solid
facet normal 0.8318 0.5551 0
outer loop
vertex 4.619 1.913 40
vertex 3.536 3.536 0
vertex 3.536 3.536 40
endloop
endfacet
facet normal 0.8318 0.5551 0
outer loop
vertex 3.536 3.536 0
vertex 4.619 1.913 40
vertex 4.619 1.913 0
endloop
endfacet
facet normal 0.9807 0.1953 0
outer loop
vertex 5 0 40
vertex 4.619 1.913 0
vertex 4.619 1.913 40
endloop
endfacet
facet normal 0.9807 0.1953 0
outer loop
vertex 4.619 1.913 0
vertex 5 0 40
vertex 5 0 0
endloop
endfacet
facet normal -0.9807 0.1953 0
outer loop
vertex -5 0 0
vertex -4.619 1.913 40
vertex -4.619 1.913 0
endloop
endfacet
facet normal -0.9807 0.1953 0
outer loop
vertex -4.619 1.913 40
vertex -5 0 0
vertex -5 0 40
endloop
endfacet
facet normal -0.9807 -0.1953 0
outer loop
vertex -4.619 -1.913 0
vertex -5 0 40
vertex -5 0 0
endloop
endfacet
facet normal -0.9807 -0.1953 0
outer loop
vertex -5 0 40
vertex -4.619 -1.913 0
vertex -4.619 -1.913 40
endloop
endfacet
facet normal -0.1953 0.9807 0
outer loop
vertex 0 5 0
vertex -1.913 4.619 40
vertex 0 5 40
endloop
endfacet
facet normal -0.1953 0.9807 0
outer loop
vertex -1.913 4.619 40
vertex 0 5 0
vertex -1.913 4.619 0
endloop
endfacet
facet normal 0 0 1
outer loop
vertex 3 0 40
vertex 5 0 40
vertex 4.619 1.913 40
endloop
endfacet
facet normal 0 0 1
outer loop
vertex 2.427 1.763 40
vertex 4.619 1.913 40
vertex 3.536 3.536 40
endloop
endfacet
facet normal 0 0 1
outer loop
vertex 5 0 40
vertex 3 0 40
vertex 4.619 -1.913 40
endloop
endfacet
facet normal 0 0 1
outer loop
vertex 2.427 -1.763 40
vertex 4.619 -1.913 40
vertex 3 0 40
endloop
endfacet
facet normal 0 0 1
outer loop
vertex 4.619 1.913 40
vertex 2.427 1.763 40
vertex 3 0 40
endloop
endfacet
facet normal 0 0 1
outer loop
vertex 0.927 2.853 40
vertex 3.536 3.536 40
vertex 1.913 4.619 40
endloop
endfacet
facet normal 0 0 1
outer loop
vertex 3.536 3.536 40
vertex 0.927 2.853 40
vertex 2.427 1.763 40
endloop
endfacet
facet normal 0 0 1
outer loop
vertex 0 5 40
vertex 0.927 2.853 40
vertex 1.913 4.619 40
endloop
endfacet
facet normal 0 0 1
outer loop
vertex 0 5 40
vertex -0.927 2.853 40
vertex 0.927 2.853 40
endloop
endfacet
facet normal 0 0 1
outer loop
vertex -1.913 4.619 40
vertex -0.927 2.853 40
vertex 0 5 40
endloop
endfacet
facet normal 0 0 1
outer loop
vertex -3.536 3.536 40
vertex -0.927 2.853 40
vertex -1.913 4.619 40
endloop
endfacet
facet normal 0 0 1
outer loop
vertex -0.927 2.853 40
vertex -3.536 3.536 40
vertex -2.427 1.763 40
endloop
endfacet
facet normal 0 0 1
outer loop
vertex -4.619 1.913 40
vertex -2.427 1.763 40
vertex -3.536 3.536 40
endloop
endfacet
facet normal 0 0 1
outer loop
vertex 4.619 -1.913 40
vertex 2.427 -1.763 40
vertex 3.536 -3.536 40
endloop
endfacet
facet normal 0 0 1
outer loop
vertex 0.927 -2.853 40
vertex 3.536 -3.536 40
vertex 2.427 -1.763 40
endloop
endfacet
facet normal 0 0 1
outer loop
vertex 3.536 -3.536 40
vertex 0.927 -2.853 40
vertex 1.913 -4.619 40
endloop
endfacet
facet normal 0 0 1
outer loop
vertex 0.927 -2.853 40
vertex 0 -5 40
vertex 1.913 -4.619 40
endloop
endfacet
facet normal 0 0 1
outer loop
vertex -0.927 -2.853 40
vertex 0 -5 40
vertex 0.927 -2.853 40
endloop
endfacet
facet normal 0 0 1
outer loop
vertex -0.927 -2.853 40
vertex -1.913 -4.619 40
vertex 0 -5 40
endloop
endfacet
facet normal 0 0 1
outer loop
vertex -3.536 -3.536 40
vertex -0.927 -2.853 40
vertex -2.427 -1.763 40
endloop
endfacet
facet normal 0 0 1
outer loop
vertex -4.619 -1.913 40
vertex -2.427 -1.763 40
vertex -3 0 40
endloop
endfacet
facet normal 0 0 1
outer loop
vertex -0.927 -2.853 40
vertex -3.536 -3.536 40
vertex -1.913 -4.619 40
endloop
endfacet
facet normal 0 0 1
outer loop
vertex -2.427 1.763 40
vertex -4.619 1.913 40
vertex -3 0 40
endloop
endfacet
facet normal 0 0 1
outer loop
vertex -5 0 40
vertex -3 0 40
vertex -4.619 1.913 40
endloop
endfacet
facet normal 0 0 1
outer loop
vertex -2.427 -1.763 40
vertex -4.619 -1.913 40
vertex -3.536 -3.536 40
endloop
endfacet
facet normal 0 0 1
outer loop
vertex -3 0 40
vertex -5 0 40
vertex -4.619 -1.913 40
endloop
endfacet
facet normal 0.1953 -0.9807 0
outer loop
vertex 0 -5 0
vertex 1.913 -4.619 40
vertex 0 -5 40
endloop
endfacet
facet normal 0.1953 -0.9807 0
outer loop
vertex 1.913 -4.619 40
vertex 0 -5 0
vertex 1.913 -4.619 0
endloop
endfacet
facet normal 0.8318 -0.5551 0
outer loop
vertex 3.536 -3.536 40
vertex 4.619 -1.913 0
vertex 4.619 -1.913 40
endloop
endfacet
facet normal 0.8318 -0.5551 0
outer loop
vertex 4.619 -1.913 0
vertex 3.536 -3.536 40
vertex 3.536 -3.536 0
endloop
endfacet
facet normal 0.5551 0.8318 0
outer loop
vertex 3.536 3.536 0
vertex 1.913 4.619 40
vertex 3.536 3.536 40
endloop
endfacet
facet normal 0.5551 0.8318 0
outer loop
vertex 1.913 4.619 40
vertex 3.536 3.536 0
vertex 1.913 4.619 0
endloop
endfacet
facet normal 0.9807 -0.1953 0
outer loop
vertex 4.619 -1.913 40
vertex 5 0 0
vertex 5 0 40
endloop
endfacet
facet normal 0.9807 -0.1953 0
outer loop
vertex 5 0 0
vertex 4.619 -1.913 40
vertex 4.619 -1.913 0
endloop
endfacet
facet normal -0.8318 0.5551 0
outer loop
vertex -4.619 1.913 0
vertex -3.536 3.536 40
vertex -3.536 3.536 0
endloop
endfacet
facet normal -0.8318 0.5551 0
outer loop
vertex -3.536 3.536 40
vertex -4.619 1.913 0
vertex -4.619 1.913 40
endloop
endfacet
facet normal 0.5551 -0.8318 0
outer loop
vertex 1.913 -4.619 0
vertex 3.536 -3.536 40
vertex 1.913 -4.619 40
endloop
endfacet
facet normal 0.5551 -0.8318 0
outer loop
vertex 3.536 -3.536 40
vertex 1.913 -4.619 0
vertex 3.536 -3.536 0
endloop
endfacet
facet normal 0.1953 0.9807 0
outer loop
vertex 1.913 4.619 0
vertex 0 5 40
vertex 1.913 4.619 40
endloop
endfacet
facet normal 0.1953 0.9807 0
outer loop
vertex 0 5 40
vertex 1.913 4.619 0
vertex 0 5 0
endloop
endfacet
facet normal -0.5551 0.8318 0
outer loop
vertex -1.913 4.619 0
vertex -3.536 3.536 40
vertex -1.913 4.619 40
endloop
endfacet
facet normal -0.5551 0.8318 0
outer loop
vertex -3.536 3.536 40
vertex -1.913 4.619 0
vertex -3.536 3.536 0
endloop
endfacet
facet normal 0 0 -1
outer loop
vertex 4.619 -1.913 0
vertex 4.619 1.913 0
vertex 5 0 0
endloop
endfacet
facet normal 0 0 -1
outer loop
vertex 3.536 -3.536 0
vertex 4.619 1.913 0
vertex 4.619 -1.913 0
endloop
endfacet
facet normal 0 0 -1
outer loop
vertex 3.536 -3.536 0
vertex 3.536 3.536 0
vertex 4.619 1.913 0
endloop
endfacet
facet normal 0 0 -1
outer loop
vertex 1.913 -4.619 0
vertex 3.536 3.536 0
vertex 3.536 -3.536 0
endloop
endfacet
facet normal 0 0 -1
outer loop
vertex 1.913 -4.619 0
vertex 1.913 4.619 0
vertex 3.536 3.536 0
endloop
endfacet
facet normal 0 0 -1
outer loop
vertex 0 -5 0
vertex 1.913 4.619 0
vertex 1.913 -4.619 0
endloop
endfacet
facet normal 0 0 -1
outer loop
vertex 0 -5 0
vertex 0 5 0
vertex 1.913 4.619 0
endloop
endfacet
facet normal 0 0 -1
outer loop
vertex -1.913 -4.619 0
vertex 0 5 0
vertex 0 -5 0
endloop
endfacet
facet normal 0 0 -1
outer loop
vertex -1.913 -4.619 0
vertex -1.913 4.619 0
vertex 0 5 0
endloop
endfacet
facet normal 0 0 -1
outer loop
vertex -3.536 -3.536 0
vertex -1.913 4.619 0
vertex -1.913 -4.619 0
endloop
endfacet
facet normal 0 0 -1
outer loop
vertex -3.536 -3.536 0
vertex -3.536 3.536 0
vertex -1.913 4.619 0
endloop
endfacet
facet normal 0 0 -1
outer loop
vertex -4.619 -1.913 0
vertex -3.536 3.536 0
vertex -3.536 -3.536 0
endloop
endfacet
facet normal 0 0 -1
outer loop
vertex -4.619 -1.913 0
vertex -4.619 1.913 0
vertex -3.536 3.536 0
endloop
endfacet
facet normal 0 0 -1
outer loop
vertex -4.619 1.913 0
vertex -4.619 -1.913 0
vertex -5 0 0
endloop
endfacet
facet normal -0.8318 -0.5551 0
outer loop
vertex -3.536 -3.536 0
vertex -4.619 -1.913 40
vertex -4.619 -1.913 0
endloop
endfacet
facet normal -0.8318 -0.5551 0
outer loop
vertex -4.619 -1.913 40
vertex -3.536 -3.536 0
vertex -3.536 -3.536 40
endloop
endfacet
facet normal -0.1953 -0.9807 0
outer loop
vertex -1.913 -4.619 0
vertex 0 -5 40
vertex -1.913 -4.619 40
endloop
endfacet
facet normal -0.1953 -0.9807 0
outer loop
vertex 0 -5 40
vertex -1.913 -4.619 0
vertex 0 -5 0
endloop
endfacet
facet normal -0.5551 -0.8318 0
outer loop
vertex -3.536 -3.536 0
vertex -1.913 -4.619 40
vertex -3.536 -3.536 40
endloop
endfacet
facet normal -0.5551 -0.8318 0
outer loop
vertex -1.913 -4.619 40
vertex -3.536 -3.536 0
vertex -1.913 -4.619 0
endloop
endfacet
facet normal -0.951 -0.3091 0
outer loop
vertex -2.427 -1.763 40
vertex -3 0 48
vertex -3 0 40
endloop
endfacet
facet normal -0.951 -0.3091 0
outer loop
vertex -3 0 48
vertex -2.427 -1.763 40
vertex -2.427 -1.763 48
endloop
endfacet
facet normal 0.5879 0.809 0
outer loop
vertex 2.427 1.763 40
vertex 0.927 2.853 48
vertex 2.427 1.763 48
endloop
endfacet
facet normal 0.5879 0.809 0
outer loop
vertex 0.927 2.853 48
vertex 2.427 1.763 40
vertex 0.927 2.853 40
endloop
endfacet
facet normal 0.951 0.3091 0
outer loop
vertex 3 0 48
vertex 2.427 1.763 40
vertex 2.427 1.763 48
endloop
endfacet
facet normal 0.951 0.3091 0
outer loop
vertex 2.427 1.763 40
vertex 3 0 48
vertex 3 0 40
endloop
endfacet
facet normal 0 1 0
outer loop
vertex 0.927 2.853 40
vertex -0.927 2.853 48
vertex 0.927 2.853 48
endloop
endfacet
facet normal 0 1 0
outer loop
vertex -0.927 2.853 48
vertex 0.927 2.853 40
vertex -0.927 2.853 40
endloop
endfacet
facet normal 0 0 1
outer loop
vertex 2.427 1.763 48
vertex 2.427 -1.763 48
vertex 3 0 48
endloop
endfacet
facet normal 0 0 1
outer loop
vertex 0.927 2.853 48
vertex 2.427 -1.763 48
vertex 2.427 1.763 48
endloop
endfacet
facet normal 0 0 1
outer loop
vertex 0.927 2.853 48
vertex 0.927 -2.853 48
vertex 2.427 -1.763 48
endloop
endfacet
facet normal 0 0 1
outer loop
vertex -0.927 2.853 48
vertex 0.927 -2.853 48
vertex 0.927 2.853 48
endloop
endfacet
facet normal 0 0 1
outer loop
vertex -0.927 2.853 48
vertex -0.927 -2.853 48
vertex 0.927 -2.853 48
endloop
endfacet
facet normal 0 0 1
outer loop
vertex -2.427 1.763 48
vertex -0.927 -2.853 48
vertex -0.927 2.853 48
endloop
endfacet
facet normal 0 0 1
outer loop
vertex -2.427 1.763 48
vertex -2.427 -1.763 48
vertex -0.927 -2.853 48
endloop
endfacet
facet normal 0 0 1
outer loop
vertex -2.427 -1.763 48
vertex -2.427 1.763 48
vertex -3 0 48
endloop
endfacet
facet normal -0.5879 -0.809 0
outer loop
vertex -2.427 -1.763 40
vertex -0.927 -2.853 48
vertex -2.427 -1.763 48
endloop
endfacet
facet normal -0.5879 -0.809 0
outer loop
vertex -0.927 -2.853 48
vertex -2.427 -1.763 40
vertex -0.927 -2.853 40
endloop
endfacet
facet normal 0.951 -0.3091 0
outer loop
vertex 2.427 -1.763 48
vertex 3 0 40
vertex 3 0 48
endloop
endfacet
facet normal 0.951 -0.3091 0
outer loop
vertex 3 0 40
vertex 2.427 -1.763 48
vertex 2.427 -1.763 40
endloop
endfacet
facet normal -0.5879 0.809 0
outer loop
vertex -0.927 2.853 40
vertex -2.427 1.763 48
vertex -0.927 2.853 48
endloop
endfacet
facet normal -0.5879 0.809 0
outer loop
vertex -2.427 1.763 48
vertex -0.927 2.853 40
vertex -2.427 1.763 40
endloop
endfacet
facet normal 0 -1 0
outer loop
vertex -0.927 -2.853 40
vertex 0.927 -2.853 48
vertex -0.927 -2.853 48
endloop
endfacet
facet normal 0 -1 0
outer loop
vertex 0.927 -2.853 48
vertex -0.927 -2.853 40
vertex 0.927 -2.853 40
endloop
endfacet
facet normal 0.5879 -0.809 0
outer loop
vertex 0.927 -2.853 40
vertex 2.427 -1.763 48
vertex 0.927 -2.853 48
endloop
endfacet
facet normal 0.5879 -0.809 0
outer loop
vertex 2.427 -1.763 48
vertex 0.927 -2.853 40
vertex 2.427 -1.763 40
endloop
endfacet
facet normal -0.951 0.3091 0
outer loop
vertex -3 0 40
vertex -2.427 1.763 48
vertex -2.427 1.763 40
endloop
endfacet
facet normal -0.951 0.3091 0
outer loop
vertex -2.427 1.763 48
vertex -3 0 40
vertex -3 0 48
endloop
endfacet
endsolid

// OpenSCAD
union() {
	union() {
		cylinder(h = 40, r = 5);
		cylinder(h = 48, r = 3);
	}
}
